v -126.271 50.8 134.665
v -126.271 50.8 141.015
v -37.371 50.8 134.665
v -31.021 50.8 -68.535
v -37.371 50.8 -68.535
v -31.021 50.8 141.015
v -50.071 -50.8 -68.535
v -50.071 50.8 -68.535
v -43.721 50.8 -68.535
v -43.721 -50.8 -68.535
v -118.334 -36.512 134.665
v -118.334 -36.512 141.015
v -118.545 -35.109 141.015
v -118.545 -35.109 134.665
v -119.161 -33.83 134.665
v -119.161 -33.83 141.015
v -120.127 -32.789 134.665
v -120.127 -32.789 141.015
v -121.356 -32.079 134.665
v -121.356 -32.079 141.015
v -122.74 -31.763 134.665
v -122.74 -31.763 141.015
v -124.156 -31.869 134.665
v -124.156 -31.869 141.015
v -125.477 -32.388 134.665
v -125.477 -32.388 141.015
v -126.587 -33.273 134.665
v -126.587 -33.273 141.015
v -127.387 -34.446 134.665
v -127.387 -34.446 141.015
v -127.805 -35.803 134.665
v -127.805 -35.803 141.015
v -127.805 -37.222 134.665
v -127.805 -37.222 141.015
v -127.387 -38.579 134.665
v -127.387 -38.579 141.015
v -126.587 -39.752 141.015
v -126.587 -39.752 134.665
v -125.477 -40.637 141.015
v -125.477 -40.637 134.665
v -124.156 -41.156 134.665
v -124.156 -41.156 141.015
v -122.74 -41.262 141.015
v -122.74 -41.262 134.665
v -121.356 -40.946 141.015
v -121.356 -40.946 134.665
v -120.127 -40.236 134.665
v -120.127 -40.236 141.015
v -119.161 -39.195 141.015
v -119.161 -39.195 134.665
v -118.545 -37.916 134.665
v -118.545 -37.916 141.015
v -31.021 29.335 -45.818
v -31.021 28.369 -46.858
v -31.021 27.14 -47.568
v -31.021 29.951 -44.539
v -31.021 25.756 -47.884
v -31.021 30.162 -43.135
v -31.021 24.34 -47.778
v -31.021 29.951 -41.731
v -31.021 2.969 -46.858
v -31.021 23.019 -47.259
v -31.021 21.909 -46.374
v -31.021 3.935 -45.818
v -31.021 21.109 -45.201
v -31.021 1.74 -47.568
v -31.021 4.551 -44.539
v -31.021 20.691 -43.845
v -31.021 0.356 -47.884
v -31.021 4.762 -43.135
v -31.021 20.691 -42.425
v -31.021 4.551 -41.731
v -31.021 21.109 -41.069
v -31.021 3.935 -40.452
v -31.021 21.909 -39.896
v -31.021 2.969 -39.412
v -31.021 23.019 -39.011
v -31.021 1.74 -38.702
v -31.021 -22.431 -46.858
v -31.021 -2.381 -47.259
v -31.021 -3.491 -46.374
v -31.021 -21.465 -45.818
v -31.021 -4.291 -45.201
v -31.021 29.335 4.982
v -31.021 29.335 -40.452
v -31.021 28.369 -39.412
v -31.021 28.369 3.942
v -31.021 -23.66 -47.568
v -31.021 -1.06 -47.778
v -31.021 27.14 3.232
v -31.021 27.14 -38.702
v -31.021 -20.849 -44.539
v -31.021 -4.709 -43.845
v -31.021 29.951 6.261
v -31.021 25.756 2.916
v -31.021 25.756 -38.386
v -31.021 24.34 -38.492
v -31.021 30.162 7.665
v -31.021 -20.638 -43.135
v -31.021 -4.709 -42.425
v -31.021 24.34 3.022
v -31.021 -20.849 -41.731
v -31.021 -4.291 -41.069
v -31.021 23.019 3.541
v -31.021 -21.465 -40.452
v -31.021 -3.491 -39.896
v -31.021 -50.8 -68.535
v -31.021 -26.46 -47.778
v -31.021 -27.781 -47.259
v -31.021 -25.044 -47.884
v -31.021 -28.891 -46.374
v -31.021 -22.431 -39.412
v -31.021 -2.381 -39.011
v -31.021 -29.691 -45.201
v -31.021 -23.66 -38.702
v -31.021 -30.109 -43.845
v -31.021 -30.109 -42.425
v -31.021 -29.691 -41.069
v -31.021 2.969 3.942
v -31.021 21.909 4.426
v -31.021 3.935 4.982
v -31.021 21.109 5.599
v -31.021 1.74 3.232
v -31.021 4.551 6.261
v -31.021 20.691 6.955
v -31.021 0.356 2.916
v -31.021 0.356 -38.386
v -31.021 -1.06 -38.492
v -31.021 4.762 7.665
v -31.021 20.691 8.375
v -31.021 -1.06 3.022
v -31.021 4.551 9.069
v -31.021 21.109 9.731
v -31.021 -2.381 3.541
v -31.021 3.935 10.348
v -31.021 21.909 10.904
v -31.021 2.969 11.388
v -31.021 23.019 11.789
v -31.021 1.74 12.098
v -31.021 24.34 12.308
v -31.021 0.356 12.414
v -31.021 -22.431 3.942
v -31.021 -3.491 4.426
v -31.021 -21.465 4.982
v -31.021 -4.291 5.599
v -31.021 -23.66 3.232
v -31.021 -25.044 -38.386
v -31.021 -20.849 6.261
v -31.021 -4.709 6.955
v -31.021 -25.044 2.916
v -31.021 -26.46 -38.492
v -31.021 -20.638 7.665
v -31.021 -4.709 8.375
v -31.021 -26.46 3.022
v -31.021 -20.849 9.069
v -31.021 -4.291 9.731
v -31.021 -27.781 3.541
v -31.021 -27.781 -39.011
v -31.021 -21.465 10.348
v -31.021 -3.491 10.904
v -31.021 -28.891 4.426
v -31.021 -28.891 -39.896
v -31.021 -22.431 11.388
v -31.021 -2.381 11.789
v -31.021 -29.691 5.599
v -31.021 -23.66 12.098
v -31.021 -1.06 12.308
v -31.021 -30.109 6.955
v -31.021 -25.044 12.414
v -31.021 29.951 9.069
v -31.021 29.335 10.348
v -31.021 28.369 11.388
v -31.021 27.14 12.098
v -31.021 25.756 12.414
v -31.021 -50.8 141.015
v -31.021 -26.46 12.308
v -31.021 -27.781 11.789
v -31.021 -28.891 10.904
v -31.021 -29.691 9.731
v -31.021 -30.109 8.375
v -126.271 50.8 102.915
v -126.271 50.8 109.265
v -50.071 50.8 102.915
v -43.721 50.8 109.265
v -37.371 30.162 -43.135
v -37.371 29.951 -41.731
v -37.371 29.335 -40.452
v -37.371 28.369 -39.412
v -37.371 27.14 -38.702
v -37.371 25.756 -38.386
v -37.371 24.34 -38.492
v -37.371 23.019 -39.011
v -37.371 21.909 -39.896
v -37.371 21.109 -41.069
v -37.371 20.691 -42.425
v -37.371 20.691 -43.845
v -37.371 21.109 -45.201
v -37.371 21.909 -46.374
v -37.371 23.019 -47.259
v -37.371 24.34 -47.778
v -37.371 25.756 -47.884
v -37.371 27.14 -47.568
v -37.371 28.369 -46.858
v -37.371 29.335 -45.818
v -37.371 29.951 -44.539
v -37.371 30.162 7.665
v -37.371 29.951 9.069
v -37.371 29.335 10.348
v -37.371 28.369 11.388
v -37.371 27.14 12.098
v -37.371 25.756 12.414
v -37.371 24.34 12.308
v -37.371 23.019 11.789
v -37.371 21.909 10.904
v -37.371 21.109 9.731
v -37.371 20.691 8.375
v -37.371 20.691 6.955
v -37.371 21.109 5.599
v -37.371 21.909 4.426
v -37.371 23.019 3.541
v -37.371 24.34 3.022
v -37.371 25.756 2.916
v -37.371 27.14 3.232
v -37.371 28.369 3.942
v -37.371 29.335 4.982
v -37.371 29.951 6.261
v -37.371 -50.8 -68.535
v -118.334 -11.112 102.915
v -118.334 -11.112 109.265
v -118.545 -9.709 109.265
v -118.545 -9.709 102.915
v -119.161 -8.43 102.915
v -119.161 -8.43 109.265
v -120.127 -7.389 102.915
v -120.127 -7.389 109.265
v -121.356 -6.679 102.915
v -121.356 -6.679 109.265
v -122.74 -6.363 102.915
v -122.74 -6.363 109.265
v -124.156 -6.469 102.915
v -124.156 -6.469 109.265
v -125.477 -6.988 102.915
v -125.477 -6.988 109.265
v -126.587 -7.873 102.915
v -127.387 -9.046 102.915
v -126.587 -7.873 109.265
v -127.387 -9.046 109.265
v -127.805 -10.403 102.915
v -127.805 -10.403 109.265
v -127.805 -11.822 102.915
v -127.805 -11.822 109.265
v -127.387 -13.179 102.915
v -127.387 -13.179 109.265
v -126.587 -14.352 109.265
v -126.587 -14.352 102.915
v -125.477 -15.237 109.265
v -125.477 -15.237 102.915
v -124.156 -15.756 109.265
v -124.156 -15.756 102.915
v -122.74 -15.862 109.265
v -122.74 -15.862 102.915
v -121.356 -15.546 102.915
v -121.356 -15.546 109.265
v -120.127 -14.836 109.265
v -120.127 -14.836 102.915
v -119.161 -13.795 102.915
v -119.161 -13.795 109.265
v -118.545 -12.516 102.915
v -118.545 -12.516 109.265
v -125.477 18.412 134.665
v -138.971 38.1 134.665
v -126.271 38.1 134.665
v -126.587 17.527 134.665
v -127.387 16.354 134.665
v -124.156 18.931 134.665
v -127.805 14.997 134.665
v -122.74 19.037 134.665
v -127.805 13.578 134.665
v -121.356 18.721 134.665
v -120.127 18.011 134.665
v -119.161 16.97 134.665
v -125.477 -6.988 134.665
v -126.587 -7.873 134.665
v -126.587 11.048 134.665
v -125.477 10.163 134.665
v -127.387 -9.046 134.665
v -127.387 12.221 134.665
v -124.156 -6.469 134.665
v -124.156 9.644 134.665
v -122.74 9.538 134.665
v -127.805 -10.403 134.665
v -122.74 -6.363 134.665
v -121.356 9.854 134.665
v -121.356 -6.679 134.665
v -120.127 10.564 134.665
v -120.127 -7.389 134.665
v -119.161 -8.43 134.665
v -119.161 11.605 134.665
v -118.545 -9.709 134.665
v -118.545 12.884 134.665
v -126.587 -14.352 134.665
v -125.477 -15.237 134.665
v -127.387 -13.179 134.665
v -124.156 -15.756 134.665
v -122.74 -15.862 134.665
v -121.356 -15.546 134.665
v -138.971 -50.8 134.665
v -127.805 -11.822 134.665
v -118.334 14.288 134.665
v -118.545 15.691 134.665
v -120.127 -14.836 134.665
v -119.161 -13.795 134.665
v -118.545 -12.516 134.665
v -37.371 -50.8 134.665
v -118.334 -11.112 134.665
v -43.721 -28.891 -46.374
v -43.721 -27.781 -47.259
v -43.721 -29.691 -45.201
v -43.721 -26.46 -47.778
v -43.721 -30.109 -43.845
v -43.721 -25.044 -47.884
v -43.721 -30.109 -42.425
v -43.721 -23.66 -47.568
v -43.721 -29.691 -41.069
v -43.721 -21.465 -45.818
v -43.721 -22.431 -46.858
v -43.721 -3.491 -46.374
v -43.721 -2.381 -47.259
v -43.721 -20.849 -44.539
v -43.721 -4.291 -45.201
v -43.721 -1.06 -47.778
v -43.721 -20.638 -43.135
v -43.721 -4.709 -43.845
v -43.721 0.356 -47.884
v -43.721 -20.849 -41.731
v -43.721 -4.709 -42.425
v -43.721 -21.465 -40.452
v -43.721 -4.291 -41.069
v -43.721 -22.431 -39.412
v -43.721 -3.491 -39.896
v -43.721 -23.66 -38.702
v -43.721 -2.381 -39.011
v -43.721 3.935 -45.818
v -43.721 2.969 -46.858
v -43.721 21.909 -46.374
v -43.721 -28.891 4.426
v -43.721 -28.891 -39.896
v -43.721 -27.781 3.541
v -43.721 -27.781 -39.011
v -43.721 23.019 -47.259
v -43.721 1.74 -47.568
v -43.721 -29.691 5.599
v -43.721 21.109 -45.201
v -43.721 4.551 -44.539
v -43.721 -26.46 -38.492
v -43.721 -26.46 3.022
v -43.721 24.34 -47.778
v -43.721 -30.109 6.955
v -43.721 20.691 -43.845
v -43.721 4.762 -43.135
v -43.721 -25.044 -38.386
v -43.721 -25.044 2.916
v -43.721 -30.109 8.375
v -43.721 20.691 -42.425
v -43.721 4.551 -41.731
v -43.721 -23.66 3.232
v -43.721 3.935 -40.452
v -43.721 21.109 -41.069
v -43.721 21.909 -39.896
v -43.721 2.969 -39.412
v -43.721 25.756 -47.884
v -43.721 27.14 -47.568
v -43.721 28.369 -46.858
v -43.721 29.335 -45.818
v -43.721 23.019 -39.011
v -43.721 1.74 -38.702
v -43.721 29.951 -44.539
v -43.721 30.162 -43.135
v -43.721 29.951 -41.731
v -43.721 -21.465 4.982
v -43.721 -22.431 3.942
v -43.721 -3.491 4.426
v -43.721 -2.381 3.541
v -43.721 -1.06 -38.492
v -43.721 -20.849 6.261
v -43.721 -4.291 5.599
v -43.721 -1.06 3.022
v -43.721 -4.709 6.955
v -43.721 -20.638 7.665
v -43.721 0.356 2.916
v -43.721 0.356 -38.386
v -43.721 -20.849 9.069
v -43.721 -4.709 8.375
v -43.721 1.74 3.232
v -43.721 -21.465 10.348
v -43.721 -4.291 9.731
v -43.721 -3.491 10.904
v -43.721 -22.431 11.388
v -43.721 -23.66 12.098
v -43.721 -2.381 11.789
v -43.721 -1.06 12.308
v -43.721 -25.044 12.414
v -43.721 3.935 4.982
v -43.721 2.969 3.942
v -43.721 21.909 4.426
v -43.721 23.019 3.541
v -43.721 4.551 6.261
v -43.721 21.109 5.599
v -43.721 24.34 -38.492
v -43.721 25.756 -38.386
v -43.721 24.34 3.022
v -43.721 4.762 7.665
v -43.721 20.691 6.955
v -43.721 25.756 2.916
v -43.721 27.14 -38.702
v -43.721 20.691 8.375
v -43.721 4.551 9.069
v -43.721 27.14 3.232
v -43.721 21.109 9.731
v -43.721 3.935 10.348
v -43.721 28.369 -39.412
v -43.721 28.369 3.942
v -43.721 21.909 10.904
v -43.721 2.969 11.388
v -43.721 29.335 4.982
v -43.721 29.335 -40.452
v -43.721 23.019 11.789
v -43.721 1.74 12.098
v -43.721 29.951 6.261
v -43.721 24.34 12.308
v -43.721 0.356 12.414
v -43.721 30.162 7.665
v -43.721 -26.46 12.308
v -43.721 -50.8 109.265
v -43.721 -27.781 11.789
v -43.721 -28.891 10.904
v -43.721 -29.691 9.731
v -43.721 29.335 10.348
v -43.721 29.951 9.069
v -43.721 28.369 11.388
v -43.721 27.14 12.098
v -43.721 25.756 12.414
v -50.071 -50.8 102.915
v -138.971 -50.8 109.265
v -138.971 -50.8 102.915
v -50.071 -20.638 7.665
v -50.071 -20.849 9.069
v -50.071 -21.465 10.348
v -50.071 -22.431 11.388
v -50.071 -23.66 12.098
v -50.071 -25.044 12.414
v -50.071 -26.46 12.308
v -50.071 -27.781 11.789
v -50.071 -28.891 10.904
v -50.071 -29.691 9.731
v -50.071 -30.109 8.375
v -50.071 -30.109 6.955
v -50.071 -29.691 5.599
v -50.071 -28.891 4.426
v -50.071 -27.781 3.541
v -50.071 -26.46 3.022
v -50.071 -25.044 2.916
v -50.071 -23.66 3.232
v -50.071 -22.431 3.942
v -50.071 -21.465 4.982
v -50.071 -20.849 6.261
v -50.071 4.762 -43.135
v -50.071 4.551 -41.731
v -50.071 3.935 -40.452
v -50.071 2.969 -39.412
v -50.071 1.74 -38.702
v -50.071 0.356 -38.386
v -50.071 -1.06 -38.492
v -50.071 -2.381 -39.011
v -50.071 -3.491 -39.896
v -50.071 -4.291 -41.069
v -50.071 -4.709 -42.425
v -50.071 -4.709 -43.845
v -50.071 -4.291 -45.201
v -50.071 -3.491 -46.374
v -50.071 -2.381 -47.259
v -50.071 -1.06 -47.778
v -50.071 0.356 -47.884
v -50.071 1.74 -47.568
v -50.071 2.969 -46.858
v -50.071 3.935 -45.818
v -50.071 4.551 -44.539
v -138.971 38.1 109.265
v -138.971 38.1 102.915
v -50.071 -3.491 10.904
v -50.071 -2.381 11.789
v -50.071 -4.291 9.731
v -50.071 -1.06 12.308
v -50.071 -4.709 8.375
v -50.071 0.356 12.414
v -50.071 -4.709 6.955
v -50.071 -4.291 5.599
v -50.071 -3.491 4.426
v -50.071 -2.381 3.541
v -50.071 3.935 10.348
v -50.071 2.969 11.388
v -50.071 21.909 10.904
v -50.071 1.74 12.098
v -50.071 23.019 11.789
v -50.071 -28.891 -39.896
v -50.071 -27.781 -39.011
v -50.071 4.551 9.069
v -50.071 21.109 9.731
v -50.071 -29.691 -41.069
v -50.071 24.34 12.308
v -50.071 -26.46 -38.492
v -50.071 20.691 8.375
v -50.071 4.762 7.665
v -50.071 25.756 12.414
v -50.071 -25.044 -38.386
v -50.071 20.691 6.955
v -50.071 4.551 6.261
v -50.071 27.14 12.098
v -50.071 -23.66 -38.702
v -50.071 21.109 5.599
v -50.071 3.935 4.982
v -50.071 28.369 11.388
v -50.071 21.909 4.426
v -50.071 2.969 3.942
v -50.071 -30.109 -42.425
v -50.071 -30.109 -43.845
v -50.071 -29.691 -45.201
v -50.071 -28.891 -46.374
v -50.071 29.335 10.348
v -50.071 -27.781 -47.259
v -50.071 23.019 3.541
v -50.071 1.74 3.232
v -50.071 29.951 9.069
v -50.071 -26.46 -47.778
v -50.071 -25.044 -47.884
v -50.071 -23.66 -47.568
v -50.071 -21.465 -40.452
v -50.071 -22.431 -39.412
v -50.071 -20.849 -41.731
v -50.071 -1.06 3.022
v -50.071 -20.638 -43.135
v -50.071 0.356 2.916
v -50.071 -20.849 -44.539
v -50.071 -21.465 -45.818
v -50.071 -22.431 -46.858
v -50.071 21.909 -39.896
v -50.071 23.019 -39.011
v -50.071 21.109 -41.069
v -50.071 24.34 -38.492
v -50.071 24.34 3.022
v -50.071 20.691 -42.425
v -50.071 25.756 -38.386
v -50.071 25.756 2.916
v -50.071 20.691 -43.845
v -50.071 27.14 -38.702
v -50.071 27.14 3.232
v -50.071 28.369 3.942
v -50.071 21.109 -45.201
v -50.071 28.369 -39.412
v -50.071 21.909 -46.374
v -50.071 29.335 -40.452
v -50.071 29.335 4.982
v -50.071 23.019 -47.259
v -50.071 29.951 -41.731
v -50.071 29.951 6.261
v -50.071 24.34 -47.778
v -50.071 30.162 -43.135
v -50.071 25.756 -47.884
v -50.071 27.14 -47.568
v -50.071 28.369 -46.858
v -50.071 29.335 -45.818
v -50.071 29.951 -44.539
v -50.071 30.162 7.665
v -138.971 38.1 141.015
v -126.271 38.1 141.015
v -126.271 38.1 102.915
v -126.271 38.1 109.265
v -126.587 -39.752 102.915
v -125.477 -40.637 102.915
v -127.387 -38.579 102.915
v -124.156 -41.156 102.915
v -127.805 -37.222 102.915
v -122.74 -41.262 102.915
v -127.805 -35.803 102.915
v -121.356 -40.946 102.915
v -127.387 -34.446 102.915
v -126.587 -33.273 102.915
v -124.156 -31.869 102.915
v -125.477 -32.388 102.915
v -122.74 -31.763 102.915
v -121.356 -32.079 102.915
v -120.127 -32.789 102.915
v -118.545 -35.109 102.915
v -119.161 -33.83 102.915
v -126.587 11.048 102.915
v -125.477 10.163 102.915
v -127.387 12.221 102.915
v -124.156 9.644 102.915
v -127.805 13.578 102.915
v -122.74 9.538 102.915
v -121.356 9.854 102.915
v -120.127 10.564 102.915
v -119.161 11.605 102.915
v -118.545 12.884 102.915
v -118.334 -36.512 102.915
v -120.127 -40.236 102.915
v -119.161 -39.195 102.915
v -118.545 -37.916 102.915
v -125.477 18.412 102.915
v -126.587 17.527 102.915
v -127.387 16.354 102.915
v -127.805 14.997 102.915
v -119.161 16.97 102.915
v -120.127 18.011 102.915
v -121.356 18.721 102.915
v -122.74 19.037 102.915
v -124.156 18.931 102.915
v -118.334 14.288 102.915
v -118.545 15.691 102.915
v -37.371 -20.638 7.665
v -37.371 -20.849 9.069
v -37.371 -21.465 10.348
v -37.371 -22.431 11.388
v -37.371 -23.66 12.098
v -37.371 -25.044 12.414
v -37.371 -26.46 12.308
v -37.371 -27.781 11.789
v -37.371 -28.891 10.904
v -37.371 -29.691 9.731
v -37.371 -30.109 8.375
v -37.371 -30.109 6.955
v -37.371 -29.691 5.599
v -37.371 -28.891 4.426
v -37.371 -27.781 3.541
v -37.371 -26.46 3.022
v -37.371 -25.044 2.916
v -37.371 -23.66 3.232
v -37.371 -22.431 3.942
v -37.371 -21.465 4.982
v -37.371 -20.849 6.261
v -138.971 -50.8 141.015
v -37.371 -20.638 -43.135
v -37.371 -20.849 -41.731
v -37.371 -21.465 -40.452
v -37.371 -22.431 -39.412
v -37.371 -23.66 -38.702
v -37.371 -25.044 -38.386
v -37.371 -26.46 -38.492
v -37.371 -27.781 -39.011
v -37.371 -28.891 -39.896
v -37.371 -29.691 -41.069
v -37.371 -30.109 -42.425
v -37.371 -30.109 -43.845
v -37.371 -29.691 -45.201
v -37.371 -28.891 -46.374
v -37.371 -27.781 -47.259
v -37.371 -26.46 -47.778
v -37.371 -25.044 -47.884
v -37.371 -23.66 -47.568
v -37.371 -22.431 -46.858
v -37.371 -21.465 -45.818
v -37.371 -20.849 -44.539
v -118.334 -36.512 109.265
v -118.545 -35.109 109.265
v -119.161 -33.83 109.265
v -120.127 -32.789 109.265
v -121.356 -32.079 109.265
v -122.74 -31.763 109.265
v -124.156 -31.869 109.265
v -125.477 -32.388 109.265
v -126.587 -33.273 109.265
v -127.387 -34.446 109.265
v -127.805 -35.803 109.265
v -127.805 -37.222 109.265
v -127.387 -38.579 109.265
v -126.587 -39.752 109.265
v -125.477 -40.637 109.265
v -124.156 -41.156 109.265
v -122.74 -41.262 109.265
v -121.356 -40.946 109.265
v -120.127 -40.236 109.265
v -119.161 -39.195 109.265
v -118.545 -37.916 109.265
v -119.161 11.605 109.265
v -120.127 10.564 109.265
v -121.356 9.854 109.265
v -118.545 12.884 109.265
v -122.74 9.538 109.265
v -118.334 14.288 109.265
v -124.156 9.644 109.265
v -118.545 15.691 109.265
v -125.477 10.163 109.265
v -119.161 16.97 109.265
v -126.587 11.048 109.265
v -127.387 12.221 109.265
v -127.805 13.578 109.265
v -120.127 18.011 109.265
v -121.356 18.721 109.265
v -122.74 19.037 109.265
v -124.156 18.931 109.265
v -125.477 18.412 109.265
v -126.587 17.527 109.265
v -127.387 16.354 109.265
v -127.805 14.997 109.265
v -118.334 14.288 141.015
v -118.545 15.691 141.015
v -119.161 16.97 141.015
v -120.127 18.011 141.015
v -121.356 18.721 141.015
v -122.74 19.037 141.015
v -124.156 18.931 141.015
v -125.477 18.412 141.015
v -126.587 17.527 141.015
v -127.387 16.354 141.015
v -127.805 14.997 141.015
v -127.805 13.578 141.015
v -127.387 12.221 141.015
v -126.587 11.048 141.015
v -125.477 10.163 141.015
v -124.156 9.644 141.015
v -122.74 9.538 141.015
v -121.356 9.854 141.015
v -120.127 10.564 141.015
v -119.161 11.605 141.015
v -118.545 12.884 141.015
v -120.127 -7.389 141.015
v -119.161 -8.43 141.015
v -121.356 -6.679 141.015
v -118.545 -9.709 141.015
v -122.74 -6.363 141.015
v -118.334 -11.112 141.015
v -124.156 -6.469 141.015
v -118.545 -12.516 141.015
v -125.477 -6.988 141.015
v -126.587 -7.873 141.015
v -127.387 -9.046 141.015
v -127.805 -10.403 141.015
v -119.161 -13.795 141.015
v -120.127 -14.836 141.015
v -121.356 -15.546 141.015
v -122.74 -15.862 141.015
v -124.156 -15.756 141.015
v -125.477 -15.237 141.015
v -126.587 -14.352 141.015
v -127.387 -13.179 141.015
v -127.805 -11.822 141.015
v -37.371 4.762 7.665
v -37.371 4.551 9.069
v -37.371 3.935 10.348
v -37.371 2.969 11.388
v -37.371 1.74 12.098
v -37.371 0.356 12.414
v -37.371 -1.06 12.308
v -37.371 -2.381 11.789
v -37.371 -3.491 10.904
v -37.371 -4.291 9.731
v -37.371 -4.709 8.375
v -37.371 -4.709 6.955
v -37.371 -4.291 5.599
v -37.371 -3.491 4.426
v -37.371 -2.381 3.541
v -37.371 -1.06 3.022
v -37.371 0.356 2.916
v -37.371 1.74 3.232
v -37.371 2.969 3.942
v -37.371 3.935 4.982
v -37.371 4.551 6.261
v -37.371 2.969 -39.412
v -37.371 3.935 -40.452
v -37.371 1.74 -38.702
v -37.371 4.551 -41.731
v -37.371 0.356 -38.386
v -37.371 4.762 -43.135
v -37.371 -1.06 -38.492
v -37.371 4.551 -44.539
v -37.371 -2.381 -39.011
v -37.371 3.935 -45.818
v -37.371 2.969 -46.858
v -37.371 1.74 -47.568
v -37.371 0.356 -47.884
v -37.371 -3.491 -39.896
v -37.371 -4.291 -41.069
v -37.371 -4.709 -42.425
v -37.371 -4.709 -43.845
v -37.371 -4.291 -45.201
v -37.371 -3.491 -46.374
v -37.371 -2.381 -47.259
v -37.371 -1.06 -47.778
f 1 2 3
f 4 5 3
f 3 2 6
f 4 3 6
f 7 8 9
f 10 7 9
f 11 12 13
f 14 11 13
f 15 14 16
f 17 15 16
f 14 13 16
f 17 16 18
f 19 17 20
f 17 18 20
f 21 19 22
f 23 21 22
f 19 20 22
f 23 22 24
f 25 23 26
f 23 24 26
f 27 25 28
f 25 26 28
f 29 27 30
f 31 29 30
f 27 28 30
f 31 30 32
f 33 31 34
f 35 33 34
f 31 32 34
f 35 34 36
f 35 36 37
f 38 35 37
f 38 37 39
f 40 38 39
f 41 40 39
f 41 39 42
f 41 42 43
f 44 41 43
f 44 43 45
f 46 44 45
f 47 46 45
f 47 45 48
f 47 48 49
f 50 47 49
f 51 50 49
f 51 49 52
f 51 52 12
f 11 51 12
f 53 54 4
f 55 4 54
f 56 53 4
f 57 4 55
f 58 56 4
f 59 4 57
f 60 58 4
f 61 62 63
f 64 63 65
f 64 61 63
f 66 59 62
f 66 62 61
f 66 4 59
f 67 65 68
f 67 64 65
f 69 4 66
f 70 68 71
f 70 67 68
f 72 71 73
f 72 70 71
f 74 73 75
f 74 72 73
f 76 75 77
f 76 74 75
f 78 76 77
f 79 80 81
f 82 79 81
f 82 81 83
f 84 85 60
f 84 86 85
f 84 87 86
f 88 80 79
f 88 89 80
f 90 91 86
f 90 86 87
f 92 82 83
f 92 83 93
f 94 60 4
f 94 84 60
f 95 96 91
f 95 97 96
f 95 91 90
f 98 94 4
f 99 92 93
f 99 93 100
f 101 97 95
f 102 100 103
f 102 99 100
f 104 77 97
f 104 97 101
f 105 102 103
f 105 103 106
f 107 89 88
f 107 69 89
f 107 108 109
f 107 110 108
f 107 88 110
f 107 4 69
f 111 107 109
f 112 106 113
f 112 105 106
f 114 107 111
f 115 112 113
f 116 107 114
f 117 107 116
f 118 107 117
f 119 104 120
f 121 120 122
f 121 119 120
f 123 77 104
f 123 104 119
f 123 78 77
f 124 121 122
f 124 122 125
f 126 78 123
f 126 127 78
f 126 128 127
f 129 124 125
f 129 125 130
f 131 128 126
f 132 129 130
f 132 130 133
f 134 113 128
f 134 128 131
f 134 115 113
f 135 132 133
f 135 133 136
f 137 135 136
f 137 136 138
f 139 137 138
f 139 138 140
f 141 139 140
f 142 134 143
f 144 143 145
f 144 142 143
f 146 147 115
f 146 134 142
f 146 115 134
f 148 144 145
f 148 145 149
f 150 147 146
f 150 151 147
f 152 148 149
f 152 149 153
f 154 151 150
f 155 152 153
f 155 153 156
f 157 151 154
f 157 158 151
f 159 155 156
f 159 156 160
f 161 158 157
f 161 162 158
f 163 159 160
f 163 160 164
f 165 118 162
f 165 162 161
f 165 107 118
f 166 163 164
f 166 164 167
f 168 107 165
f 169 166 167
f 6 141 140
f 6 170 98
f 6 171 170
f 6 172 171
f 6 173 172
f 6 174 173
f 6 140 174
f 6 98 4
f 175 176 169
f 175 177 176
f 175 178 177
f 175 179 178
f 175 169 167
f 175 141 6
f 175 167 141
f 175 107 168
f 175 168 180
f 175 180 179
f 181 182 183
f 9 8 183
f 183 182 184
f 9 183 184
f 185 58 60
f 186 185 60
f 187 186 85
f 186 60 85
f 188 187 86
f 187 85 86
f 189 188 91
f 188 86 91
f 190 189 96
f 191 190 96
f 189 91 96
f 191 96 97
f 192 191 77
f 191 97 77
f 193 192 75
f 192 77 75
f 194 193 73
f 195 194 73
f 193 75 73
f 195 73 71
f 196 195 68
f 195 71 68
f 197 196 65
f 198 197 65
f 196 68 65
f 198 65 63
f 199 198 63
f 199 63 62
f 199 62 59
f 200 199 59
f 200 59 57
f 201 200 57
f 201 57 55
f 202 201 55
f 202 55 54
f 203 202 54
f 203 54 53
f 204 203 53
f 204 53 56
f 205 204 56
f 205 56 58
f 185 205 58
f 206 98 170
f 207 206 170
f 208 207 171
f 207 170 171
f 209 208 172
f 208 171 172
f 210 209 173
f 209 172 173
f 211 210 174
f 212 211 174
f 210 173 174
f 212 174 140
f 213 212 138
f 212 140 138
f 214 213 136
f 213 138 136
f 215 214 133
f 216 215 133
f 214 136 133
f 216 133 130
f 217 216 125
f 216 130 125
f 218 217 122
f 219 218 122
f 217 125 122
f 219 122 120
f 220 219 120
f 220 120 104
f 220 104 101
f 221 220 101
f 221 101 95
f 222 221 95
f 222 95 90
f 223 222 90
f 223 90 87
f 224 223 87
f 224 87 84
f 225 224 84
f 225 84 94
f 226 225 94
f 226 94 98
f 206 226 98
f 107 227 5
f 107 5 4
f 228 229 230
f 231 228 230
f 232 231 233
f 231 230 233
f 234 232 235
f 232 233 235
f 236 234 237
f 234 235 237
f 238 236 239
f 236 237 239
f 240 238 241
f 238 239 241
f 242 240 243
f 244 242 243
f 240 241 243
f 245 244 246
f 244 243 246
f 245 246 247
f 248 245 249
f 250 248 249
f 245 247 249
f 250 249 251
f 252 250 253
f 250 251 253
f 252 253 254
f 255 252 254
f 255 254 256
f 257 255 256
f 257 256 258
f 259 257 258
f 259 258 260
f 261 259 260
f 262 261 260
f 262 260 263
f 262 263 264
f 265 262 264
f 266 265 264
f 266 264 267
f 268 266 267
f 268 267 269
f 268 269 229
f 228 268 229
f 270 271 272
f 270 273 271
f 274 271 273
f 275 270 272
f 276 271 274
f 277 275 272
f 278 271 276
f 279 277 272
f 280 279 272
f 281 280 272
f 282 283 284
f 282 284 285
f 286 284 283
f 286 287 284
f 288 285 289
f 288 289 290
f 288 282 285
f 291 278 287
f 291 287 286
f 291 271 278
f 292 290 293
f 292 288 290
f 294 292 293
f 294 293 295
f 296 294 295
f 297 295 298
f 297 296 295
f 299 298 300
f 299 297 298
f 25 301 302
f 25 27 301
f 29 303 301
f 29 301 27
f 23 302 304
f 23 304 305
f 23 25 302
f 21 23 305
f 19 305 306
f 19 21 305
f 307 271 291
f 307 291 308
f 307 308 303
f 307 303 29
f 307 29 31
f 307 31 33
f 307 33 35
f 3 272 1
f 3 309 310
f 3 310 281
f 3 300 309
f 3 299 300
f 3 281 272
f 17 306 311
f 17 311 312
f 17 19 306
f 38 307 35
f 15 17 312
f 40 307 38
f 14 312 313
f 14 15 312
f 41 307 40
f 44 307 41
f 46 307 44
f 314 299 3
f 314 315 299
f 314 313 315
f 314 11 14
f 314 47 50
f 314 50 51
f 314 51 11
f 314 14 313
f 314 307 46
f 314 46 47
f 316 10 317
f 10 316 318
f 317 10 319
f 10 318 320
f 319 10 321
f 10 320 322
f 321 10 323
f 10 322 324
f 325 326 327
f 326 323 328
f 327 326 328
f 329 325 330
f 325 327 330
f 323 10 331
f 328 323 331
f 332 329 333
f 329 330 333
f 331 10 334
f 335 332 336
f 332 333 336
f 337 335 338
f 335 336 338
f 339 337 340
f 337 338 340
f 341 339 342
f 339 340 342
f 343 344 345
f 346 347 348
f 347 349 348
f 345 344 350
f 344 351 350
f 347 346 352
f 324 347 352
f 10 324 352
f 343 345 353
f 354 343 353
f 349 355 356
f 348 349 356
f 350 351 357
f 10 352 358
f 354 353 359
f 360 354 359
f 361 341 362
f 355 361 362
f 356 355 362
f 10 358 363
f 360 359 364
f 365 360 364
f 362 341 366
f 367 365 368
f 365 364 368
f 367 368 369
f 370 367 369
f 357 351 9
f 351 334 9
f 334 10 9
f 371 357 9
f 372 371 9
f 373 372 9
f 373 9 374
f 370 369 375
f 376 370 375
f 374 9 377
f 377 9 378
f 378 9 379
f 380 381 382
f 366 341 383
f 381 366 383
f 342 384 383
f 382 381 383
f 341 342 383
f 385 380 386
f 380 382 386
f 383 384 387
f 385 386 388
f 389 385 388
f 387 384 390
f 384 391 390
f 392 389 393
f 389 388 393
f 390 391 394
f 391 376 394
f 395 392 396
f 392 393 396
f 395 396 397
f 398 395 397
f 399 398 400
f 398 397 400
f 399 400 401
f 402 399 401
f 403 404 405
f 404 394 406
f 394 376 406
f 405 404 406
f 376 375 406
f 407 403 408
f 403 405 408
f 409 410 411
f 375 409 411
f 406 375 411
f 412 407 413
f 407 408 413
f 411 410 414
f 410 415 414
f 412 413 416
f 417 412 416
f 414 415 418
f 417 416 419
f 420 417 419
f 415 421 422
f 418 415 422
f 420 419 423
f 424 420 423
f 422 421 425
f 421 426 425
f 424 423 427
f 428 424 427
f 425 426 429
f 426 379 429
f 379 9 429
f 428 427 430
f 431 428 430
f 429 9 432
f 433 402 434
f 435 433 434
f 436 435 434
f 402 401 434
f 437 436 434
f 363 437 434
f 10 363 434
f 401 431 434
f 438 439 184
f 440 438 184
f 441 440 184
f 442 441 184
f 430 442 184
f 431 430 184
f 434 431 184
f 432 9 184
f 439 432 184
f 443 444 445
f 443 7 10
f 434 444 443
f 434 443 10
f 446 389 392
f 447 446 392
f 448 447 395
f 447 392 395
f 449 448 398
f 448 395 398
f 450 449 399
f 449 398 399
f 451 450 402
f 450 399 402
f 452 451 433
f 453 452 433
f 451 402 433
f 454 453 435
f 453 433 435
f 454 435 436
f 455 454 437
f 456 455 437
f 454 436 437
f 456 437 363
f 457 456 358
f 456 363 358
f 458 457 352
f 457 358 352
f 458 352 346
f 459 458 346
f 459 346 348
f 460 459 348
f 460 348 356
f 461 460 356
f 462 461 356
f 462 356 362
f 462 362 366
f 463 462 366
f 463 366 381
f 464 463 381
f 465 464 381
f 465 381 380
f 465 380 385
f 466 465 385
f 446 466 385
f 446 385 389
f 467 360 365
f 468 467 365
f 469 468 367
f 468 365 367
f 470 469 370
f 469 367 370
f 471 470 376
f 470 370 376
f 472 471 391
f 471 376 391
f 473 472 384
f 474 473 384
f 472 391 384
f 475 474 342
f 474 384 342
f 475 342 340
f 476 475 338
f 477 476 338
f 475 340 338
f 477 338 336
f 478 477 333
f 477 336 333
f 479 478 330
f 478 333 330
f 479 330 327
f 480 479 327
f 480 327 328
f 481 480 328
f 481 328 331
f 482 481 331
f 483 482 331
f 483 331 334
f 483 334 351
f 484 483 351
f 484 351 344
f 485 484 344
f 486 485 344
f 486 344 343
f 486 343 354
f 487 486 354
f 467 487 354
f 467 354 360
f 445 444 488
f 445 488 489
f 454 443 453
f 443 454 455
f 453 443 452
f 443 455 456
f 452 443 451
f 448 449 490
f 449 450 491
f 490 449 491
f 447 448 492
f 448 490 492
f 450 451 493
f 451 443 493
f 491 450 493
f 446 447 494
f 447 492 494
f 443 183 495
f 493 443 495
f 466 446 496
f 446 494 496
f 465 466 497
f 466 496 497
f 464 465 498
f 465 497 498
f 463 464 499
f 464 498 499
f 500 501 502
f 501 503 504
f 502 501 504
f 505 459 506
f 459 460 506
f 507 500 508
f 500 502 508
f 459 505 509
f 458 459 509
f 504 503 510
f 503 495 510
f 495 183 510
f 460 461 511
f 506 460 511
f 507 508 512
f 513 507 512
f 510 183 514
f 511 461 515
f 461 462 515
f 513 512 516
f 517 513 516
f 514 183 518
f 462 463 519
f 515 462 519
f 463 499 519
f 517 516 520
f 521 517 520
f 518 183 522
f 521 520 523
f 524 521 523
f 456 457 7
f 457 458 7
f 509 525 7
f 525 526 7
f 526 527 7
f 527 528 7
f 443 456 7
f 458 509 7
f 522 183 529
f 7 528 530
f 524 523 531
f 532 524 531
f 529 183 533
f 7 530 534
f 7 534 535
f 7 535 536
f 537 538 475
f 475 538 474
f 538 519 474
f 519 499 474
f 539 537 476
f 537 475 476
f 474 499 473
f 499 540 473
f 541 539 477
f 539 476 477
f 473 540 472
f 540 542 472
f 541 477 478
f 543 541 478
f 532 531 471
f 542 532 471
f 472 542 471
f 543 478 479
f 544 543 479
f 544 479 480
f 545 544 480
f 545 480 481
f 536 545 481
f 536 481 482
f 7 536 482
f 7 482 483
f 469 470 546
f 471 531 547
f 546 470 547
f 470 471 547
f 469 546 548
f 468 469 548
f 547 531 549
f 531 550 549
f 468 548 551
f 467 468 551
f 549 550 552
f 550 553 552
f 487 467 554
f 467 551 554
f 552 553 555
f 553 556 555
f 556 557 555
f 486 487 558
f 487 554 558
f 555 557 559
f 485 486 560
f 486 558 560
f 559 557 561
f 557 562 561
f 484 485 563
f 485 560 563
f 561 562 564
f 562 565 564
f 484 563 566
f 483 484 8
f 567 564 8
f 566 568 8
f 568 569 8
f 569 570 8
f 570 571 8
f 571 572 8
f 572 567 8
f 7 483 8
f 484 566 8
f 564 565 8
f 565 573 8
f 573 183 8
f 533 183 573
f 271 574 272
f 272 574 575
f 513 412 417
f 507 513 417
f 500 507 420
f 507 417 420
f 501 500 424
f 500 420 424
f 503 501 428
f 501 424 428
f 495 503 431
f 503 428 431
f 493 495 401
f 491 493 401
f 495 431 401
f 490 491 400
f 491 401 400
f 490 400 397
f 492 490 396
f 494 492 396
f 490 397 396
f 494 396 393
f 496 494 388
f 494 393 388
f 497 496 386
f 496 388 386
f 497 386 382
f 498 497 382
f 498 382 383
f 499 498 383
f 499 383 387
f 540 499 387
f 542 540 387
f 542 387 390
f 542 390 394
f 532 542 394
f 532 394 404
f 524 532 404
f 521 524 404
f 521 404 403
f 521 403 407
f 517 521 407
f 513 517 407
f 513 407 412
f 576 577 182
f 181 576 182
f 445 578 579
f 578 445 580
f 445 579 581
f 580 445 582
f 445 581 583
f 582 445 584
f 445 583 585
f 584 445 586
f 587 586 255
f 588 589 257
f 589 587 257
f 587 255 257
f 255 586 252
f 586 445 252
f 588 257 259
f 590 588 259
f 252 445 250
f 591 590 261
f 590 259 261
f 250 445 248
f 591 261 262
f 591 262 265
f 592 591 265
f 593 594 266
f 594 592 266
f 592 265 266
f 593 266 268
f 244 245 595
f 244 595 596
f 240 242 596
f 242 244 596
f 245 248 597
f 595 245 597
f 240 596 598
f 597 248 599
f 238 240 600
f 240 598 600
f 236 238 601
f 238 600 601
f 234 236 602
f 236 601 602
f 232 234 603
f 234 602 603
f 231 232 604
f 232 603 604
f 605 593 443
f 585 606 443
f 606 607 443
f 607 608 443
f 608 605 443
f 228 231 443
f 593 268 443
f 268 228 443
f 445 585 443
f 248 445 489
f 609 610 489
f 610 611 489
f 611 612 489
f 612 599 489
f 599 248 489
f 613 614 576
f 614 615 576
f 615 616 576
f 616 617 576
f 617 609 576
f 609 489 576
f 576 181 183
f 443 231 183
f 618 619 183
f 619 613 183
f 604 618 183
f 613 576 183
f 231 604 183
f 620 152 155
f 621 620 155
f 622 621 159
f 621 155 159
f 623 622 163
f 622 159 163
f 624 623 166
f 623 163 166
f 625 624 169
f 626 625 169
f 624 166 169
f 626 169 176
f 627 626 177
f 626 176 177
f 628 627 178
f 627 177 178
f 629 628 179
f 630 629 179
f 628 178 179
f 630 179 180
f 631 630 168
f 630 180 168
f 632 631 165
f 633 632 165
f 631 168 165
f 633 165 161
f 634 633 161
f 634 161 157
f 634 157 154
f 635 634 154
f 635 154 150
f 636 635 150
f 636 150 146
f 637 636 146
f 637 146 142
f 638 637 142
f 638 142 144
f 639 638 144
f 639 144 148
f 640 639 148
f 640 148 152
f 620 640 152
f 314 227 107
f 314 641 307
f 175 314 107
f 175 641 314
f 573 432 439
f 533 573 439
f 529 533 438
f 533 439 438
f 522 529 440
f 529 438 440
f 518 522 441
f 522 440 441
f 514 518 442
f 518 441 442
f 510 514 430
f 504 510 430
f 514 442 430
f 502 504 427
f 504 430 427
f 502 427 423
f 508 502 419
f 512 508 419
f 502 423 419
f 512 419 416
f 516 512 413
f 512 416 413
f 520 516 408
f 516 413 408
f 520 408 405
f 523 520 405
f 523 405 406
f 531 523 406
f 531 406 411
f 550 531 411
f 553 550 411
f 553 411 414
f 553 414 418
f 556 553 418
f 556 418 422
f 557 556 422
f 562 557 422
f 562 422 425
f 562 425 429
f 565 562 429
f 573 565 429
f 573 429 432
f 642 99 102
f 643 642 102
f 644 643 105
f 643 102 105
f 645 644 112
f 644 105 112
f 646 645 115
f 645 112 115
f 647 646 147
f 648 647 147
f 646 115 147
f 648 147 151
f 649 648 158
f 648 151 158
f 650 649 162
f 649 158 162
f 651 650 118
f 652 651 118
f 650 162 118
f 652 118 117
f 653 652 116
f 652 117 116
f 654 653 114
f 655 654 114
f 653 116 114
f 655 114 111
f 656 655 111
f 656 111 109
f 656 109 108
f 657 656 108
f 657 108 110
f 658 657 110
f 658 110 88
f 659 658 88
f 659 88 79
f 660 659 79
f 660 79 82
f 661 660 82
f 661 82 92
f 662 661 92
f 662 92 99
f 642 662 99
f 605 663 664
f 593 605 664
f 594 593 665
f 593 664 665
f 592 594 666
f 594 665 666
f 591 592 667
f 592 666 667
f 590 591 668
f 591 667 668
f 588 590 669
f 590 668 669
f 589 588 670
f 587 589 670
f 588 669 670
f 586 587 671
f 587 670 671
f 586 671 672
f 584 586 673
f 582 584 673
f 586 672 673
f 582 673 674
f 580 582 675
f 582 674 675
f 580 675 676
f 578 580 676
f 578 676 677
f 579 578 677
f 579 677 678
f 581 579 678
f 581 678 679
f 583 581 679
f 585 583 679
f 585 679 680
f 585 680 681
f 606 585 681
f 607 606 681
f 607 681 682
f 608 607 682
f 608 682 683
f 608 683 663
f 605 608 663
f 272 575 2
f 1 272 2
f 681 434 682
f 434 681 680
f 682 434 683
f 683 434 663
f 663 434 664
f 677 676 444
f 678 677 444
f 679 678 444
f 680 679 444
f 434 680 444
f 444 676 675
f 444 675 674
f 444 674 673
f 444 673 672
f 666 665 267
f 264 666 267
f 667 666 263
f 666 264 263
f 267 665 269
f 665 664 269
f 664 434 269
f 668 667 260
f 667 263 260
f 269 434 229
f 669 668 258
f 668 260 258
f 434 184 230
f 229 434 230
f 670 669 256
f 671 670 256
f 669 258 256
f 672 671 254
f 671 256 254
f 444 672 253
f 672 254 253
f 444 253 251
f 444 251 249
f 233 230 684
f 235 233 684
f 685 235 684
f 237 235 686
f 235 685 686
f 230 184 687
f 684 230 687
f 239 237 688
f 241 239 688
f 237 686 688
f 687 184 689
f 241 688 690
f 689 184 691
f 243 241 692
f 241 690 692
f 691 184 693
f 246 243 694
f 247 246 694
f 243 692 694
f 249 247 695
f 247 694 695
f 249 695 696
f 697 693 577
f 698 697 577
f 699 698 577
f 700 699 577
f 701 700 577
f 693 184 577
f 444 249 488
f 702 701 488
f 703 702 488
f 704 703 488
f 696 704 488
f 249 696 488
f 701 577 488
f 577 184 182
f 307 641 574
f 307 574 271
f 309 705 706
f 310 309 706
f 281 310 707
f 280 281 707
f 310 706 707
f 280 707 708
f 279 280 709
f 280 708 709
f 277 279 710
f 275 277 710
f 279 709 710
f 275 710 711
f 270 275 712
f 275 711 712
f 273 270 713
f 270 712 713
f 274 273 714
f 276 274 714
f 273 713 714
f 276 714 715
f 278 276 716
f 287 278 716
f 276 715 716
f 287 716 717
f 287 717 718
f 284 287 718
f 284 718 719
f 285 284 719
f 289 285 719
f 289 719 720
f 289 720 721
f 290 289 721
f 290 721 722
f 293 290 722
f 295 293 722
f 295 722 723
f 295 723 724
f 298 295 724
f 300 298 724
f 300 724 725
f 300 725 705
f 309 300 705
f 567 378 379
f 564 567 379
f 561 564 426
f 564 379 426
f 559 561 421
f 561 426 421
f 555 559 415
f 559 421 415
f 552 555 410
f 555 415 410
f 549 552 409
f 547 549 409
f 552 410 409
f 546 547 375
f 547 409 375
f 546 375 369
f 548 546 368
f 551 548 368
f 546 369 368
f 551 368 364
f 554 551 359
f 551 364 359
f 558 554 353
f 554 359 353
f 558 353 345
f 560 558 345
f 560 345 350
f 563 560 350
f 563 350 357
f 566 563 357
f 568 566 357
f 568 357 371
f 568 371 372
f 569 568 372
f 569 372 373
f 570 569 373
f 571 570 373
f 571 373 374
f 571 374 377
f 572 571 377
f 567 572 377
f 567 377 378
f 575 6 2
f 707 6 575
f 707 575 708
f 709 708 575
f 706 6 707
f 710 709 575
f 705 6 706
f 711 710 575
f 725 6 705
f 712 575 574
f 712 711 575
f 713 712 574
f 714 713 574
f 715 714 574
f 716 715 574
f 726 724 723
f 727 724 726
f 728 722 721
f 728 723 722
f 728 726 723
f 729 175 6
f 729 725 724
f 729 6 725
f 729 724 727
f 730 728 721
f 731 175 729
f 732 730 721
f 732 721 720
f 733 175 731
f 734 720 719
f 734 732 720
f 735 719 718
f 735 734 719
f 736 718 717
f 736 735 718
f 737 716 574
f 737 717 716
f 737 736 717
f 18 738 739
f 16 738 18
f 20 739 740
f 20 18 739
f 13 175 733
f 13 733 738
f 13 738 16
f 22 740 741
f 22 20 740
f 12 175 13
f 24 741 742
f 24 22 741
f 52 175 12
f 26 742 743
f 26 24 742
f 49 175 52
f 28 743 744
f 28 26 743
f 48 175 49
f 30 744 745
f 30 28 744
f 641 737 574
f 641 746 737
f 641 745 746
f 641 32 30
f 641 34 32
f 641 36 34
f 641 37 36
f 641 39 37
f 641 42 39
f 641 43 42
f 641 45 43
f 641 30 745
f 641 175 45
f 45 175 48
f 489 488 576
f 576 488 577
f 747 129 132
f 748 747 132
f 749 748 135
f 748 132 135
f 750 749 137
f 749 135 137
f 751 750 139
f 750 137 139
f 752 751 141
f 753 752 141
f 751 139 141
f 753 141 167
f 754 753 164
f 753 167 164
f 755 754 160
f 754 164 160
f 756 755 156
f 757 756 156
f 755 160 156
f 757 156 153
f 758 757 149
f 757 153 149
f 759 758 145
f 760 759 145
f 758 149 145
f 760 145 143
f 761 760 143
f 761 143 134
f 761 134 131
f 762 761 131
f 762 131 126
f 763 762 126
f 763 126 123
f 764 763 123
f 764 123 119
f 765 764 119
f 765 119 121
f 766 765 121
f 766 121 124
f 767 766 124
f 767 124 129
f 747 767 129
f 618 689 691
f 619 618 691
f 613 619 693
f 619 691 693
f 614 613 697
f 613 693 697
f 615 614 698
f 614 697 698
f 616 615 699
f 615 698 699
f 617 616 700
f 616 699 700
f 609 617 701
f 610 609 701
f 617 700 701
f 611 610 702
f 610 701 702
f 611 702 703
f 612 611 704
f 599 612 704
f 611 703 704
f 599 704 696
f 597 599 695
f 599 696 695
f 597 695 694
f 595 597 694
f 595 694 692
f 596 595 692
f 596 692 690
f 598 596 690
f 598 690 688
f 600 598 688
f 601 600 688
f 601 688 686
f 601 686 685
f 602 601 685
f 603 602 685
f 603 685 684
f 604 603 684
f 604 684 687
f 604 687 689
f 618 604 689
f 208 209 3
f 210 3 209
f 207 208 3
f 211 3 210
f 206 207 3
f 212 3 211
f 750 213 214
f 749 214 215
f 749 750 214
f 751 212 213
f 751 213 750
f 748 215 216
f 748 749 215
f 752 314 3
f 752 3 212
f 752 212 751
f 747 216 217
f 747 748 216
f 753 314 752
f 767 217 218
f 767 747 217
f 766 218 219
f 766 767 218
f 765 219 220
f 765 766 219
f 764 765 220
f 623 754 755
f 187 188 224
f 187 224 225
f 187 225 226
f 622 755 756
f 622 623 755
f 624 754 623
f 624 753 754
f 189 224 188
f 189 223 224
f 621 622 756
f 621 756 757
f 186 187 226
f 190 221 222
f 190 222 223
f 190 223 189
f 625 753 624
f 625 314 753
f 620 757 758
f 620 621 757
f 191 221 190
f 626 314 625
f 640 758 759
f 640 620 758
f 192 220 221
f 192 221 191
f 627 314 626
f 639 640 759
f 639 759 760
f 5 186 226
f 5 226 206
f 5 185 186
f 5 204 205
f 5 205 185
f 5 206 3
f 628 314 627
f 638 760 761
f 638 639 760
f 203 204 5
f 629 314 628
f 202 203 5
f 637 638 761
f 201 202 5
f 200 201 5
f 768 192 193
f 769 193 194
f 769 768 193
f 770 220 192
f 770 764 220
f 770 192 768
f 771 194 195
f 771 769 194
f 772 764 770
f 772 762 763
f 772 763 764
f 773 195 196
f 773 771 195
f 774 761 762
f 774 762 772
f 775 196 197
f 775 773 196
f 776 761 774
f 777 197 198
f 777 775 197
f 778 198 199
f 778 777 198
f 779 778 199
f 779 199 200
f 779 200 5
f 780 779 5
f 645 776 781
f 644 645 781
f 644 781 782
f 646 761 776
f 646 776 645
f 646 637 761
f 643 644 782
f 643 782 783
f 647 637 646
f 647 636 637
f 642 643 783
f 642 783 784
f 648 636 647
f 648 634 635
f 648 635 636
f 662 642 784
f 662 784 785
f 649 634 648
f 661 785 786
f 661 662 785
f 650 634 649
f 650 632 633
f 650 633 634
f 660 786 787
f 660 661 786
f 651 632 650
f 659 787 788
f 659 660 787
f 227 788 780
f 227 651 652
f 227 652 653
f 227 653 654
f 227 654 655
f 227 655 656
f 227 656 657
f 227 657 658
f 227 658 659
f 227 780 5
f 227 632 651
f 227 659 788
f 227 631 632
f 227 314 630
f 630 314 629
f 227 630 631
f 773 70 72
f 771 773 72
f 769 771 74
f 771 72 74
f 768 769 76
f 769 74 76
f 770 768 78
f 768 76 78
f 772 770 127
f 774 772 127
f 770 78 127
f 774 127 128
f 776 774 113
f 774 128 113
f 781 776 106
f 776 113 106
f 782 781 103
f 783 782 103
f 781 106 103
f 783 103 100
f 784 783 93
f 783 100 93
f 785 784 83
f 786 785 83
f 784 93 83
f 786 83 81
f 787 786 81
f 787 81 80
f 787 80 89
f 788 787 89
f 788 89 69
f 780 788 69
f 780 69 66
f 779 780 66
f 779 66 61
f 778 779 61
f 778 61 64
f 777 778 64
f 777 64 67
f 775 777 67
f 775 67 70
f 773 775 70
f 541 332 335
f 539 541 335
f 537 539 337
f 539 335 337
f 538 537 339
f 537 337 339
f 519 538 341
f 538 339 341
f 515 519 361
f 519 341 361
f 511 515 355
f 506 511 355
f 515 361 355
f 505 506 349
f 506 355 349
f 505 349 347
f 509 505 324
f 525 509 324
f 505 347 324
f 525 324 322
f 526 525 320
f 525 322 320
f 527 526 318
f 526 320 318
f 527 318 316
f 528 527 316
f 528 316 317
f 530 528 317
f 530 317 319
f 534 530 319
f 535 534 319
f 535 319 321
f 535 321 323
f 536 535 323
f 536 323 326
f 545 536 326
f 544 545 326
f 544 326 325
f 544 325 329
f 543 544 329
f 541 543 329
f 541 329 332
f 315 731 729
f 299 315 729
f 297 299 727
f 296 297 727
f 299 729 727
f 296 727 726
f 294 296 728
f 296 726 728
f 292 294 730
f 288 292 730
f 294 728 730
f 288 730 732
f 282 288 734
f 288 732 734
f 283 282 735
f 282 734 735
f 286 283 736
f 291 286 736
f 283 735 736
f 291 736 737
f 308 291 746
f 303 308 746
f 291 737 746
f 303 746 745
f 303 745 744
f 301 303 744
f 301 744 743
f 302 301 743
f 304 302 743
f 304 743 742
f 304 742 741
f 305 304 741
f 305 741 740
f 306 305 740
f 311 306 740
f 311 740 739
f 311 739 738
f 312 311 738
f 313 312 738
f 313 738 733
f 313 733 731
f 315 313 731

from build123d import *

# Parameters (mm, degrees)
F1_DEPTH = 50.8
F2_R     = 4.7625
F3_DEPTH = 107.951
F4_R     = 4.7625
F4_W     = 12.7
F4_H     = 12.7
F5_DEPTH = 209.551


with BuildPart() as f1:
    # F0 (on Front) → F1 (new body, symmetric)
    with BuildSketch(Plane.XZ):
        Polygon((-43.721065, 109.265013), (-138.971065, 109.265013), (-138.971065, 102.915013), (-50.071065, 102.915013), (-50.071065, -68.534987), (-43.721065, -68.534987), align=None)
        Polygon((-138.971065, 134.665013), (-37.371065, 134.665013), (-37.371065, -68.534987), (-31.021065, -68.534987), (-31.021065, 141.015013), (-138.971065, 141.015013), align=None)
    extrude(amount=F1_DEPTH, both=True)

    # F2 (on face) → F3 (cut, through all)
    with BuildSketch(Plane.YZ.offset(-31.021065)):
        with Locations((-25.4, -43.134987)):
            Circle(F2_R)
        with Locations((-25.4, 7.665013)):
            Circle(F2_R)
        with Locations((0, -43.134987)):
            Circle(F2_R)
        with Locations((0, 7.665013)):
            Circle(F2_R)
        with Locations((25.4, -43.134987)):
            Circle(F2_R)
        with Locations((25.4, 7.665013)):
            Circle(F2_R)
    extrude(amount=-F3_DEPTH, mode=Mode.SUBTRACT)

    # F4 (on face) → F5 (cut, through all)
    with BuildSketch(Plane.XY.offset(141.015013)):
        with Locations((-123.096065, -36.5125)):
            Circle(F4_R)
        with Locations((-123.096065, -11.1125)):
            Circle(F4_R)
        with Locations((-123.096065, 14.2875)):
            Circle(F4_R)
        with Locations((-132.621065, 44.45)):
            Rectangle(F4_W, F4_H)
    extrude(amount=-F5_DEPTH, mode=Mode.SUBTRACT)


solid = f1.part
